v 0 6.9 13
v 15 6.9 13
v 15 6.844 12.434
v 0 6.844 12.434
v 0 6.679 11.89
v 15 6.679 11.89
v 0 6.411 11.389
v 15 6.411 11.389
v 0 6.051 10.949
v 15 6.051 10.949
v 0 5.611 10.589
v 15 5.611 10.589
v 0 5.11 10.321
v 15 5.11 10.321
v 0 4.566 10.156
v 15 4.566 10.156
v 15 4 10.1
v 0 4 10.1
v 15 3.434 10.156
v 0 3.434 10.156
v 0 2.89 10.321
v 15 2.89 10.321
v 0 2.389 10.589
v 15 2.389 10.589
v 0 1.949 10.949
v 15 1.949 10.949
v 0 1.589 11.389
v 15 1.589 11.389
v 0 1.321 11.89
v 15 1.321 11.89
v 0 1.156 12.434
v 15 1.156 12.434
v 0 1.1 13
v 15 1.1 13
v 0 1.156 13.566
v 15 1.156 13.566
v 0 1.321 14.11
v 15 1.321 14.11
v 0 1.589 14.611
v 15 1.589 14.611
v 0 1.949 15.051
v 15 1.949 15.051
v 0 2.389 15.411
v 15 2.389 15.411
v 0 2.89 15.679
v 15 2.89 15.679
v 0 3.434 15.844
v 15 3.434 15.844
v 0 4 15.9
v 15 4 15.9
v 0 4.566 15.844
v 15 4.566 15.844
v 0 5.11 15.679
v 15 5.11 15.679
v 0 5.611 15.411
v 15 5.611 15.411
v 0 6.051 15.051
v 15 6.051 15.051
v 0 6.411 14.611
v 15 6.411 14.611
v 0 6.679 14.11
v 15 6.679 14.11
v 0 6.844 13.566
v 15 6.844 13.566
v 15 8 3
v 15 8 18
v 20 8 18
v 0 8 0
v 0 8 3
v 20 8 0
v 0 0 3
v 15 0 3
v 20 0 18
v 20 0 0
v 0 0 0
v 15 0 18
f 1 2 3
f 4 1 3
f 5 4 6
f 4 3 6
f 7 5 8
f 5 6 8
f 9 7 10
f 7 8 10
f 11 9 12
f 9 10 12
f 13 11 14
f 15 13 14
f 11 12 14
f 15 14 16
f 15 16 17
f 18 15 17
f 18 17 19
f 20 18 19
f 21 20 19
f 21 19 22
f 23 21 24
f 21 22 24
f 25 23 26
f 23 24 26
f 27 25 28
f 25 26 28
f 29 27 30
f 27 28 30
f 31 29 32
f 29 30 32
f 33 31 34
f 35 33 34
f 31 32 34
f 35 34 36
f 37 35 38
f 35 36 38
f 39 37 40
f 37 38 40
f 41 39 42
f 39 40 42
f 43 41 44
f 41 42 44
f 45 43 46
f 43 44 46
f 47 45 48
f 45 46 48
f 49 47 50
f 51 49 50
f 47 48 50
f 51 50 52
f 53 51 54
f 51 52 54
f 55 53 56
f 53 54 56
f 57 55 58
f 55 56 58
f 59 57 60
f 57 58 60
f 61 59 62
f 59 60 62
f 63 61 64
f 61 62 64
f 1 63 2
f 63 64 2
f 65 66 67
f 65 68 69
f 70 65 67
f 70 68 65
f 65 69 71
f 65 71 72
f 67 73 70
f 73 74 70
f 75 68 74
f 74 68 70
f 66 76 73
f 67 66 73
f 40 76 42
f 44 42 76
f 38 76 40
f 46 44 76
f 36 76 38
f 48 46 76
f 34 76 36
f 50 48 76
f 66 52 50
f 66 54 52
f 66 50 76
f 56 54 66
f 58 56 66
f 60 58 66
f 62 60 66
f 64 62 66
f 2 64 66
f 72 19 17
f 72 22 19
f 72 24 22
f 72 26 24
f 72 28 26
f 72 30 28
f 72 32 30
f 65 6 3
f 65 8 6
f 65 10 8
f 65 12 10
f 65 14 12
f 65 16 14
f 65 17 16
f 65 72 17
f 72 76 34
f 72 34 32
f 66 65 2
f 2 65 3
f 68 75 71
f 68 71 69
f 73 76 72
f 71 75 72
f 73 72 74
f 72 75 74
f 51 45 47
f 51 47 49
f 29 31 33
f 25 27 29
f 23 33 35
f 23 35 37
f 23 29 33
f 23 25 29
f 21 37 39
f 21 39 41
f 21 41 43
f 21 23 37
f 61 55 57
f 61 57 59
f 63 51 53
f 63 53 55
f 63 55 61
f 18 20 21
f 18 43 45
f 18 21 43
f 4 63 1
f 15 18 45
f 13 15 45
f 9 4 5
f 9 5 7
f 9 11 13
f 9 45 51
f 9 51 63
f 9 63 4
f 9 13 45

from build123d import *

# Parameters (mm, degrees)
ESQUISSE1_W        = 20
ESQUISSE1_H        = 8
BOSS_EXTRU_1_DEPTH = 3
ESQUISSE2_W        = 5
ESQUISSE2_H        = 8
BOSS_EXTRU_2_DEPTH = 15
ESQUISSE3_R        = 2.9
BOSS_EXTRU_3_DEPTH = 15


with BuildPart() as part:
    # Esquisse1 → Boss.-Extru.1 (new body)
    with BuildSketch(Plane.XY):
        with Locations((10, 4)):
            Rectangle(ESQUISSE1_W, ESQUISSE1_H)
    extrude(amount=BOSS_EXTRU_1_DEPTH)

    # Esquisse2 → Boss.-Extru.2 (add)
    with BuildSketch(Plane.XY.offset(3)):
        with Locations((17.5, 4)):
            Rectangle(ESQUISSE2_W, ESQUISSE2_H)
    extrude(amount=BOSS_EXTRU_2_DEPTH)

    # Esquisse3 → Boss.-Extru.3 (add)
    with BuildSketch(Plane.ZY.offset(-15)):
        with Locations(Location((13, 4, 0), (0, 0, 90))):
            Circle(ESQUISSE3_R)
    extrude(amount=BOSS_EXTRU_3_DEPTH)


solid = part.part
